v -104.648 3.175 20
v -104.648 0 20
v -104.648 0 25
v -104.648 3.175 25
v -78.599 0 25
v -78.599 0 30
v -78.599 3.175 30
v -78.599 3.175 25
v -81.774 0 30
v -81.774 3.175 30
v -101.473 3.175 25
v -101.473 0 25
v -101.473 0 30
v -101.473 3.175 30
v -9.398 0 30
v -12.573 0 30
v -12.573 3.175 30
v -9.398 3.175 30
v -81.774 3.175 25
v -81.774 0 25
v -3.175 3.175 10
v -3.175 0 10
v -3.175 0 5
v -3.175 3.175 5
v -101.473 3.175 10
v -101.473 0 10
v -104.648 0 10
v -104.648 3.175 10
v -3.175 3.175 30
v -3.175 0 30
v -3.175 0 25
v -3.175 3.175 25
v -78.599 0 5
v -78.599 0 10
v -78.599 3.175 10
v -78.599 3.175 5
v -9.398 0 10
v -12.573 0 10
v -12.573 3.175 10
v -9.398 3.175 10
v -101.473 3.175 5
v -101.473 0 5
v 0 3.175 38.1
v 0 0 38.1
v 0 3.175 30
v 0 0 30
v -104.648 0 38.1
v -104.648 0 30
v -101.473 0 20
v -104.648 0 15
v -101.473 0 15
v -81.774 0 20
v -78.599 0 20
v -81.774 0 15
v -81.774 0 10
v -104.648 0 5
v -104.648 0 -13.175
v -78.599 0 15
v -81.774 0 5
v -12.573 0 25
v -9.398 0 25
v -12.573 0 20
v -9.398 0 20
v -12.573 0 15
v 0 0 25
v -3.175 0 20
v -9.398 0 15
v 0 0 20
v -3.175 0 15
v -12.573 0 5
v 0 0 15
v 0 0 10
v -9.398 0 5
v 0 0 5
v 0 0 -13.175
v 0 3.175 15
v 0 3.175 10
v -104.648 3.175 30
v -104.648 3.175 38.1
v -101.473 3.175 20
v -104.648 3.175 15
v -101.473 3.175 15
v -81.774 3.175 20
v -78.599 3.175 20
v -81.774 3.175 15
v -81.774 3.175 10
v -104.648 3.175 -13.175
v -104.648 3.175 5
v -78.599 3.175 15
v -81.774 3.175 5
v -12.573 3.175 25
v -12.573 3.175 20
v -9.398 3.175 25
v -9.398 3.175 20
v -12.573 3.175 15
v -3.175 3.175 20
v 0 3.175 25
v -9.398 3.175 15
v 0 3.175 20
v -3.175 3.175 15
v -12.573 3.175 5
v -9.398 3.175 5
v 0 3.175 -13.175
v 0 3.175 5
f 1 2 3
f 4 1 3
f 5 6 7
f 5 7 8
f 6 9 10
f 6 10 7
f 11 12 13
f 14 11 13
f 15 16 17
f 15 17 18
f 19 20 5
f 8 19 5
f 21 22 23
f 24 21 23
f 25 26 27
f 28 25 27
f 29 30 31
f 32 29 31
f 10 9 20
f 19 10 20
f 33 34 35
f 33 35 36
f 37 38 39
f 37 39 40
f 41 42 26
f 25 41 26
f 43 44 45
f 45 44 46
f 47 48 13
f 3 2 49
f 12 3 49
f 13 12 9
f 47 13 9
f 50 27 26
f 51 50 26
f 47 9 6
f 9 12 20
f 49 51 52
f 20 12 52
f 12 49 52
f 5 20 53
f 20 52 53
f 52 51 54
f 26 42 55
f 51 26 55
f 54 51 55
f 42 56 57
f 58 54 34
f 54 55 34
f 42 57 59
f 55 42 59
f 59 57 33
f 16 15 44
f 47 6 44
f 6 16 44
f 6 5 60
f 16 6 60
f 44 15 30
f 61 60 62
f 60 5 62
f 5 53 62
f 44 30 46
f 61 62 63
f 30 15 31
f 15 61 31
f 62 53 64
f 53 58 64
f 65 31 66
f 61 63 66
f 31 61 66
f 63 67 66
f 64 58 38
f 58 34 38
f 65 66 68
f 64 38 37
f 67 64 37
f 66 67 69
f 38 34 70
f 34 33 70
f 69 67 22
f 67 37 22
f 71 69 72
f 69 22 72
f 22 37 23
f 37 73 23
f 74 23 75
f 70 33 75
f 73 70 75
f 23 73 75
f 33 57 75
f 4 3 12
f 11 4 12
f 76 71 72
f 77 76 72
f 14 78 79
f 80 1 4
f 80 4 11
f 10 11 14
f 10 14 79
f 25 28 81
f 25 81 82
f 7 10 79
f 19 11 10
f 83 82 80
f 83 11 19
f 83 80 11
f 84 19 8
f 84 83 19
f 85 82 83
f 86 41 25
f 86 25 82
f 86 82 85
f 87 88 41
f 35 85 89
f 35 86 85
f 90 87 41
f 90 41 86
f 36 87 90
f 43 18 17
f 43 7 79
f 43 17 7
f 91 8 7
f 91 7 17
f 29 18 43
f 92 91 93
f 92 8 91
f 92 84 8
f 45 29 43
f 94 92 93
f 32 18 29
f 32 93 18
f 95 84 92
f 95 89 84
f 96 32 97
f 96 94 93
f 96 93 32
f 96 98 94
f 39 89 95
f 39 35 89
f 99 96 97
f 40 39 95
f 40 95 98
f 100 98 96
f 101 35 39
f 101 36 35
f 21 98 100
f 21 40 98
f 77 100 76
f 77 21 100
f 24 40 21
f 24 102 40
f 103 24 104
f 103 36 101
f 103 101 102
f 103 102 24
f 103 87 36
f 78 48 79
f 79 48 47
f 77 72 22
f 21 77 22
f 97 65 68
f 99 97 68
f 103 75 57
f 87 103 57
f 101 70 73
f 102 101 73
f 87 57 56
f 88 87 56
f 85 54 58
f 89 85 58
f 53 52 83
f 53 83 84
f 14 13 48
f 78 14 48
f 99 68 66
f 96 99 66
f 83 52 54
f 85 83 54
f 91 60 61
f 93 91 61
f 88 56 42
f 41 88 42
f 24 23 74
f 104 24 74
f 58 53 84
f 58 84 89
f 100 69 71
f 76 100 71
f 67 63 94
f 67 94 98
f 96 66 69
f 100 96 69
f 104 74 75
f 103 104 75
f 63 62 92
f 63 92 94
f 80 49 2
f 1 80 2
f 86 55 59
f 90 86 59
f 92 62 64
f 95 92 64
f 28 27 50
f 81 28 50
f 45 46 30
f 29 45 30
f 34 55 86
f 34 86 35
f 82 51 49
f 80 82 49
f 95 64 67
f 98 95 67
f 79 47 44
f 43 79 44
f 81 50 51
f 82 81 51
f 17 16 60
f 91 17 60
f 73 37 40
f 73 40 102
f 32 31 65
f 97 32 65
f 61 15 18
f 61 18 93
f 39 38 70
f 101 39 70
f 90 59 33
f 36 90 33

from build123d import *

# Parameters (mm, degrees)
SKETCH1_W           = 3.175
SKETCH1_H           = 5
BOSS_EXTRUDE1_DEPTH = 3.175


with BuildPart() as part:
    # Sketch1 → Boss-Extrude1 (new body)
    with BuildSketch(Plane(origin=(0, 0, 0), x_dir=(1, 0, 0), z_dir=(0, 1, 0))):
        Polygon((-104.648, -5), (-101.473, -5), (-101.473, -10), (-104.648, -10), (-104.648, -15), (-101.473, -15), (-101.473, -20), (-104.648, -20), (-104.648, -25), (-101.473, -25), (-101.473, -30), (-104.648, -30), (-104.648, -38.1), (-101.473, -38.1), (-3.175, -38.1), (0, -38.1), (0, -30), (-3.175, -30), (-3.175, -25), (0, -25), (0, -20), (-3.175, -20), (-3.175, -15), (0, -15), (0, -10), (-3.175, -10), (-3.175, -5), (0, -5), (0, 0), (0, 3.175), (0, 13.175), (-104.648, 13.175), (-104.648, 3.175), (-104.648, 0), align=None)
        with Locations((-80.186500028, -7.5)):
            Rectangle(SKETCH1_W, SKETCH1_H, mode=Mode.SUBTRACT)
        with Locations((-80.186500028, -17.5)):
            Rectangle(SKETCH1_W, SKETCH1_H, mode=Mode.SUBTRACT)
        with Locations((-80.186500028, -27.5)):
            Rectangle(SKETCH1_W, SKETCH1_H, mode=Mode.SUBTRACT)
        with Locations((-10.9855, -27.5)):
            Rectangle(SKETCH1_W, SKETCH1_H, mode=Mode.SUBTRACT)
        with Locations((-10.9855, -17.5)):
            Rectangle(SKETCH1_W, SKETCH1_H, mode=Mode.SUBTRACT)
        with Locations((-10.9855, -7.5)):
            Rectangle(SKETCH1_W, SKETCH1_H, mode=Mode.SUBTRACT)
    extrude(amount=BOSS_EXTRUDE1_DEPTH)


solid = part.part
